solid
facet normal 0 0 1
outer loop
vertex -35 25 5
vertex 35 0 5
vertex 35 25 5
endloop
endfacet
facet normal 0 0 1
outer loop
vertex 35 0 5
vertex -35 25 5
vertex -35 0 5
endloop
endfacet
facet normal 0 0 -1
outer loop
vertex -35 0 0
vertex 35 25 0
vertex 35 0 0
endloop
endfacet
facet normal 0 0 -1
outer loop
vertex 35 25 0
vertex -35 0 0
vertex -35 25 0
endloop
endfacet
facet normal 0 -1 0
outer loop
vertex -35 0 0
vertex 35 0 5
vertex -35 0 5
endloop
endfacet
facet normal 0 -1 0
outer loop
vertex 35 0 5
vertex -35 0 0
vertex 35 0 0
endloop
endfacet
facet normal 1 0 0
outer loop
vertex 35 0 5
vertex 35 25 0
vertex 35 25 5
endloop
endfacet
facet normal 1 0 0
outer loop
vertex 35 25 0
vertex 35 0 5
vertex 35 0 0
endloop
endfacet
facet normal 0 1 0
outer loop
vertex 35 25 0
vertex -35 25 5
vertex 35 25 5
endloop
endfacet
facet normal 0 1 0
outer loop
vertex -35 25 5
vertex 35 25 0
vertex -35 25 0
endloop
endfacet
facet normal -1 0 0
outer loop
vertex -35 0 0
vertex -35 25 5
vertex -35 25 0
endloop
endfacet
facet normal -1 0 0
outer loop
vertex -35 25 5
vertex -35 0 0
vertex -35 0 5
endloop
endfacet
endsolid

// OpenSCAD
// file: Config.scad
/***********************************/
/*                                 */
/* Configuration                   */
/*                                 */
/***********************************/

/* [Axe des trous] */
// Ecart par rapport a la face avant
ecartAxe = 30;
// Ecart entre le trou filete et les deux trous lisses
ecartTrous = 25;

/* [Trou filete] */
// Diametre du trou filete
fileteDM = 8;
// Profondeur du trou filete
filetePF = 20;

/* [Trou lisses] */
// Diametre des trous lisses
lissesDM = 8;
// Profondeur des trous lisses
lissesPF = 20;

/* [Dimensions du rebort] */
// Hauteur du rebort
rebortHT = 10;
// Epaisseur du rebort
rebortEP = 20;

/* [Dimensions des cylindres] */
// Hauteur des cylindres
cylindresHT = 30;
// Epaisseur des cylindres
cylindresEP = 3;

fudge = 0.1;
// file: SupportHaut.scad
/***********************************/
/*                                 */
/* Support du haut                 */
/*                                 */
/***********************************/

include <Config.scad>

module supportHaut()
{
    
}

supportHaut();
// file: SupportCentral.scad
/***********************************/
/*                                 */
/* Support central                 */
/*                                 */
/***********************************/

include <Config.scad>

module supportCentral()
{
    
}

supportCentral();
// file: SupportBas.scad
/***********************************/
/*                                 */
/* Support du bas                  */
/*                                 */
/***********************************/

include <Config.scad>

/* [Dimensions du support] */
// Hauteur du support
supportHT = 30;
// Longueur du support
supportLG = 70;
// Epaisseur du support
supportEP = 5;


module supportBas()
{
    color("gold")
    union ()
    {
        translate([-supportLG/2,0,0])
        cube([supportLG,rebortEP+supportEP,supportEP]);
        
        
    }    
//    translate([-supportLG/2,0,0])
//    difference ()
//    {
//        // Support principal
//        cube([supportLG, supportEP, supportHT]);
//        
//        // Rebort
//        translate([-fudge,-fudge,-fudge])
//        cube([supportLG+2*fudge, rebortEP+fudge, rebortHT+fudge]);
//        
//        translate([supportLG/2,ecartAxe,supportHT])
//        {
//            // Trou filete
//            #color("red")
//            translate([0,0,-filetePF/2])
//            cylinder(d=fileteDM, h=filetePF+fudge, center=true);
//            
//            // Trou lisse de gauche
//            #color("green")
//            translate([-ecartTrous, 0, -lissesPF/2])
//            cylinder(d=lissesDM, h=lissesPF+fudge, center=true);
//            
//            // Trou lisse de droite
//            #color("blue")
//            translate([ecartTrous, 0, -lissesPF/2])
//            cylinder(d=lissesDM, h=lissesPF+fudge, center=true);
//        }
//    }
}

supportBas();
// main file
/***********************************/
/*                                 */
/* Combo                           */
/*                                 */
/***********************************/

use <SupportBas.scad>
use <SupportCentral.scad>
use <SupportHaut.scad>

include <Config.scad>

/* [Paroi] */
// Hauteur de la paroi
paroiHT = 1000;
// Longueur de la paroi
paroiLG = 1000;
// Epaisseur de la paroi
paroiEP = 15;

/* [Fente] */
// Hauteur maximale de la fente
fenteHT = 195;
// Largeur de la fente
fenteLG = 35;
// Ecart entre la fente et le rebord
ecart = 10;

module decor()
{
    // Decor
    // -------
    %union ()
    {
        translate([0,-paroiEP/2,fenteHT/2+ecart+rebortHT])
        difference ()
        {
            // Paroi
            cube([paroiLG, paroiEP, paroiLG], center=true);

            // Fente
            translate([0,0,0])
            union ()
            {
                cube([fenteLG, paroiEP+2*fudge, fenteHT-fenteLG], center=true);
                
                translate([0,0,(fenteHT-fenteLG)/2])
                rotate([90,0,0])
                cylinder(d=fenteLG, h=paroiEP+2*fudge, center=true);
                
                translate([0,0,-(fenteHT-fenteLG)/2])
                rotate([90,0,0])
                cylinder(d=fenteLG, h=paroiEP+2*fudge, center=true);
            }
        }
        
        // Rebord
        translate([0,rebortEP/2,rebortHT/2])
        cube([paroiLG, rebortEP, rebortHT], center=true);
    }
}

decor();

translate([0,0,0])
{
    supportBas();
    supportCentral();
    supportHaut();
}
